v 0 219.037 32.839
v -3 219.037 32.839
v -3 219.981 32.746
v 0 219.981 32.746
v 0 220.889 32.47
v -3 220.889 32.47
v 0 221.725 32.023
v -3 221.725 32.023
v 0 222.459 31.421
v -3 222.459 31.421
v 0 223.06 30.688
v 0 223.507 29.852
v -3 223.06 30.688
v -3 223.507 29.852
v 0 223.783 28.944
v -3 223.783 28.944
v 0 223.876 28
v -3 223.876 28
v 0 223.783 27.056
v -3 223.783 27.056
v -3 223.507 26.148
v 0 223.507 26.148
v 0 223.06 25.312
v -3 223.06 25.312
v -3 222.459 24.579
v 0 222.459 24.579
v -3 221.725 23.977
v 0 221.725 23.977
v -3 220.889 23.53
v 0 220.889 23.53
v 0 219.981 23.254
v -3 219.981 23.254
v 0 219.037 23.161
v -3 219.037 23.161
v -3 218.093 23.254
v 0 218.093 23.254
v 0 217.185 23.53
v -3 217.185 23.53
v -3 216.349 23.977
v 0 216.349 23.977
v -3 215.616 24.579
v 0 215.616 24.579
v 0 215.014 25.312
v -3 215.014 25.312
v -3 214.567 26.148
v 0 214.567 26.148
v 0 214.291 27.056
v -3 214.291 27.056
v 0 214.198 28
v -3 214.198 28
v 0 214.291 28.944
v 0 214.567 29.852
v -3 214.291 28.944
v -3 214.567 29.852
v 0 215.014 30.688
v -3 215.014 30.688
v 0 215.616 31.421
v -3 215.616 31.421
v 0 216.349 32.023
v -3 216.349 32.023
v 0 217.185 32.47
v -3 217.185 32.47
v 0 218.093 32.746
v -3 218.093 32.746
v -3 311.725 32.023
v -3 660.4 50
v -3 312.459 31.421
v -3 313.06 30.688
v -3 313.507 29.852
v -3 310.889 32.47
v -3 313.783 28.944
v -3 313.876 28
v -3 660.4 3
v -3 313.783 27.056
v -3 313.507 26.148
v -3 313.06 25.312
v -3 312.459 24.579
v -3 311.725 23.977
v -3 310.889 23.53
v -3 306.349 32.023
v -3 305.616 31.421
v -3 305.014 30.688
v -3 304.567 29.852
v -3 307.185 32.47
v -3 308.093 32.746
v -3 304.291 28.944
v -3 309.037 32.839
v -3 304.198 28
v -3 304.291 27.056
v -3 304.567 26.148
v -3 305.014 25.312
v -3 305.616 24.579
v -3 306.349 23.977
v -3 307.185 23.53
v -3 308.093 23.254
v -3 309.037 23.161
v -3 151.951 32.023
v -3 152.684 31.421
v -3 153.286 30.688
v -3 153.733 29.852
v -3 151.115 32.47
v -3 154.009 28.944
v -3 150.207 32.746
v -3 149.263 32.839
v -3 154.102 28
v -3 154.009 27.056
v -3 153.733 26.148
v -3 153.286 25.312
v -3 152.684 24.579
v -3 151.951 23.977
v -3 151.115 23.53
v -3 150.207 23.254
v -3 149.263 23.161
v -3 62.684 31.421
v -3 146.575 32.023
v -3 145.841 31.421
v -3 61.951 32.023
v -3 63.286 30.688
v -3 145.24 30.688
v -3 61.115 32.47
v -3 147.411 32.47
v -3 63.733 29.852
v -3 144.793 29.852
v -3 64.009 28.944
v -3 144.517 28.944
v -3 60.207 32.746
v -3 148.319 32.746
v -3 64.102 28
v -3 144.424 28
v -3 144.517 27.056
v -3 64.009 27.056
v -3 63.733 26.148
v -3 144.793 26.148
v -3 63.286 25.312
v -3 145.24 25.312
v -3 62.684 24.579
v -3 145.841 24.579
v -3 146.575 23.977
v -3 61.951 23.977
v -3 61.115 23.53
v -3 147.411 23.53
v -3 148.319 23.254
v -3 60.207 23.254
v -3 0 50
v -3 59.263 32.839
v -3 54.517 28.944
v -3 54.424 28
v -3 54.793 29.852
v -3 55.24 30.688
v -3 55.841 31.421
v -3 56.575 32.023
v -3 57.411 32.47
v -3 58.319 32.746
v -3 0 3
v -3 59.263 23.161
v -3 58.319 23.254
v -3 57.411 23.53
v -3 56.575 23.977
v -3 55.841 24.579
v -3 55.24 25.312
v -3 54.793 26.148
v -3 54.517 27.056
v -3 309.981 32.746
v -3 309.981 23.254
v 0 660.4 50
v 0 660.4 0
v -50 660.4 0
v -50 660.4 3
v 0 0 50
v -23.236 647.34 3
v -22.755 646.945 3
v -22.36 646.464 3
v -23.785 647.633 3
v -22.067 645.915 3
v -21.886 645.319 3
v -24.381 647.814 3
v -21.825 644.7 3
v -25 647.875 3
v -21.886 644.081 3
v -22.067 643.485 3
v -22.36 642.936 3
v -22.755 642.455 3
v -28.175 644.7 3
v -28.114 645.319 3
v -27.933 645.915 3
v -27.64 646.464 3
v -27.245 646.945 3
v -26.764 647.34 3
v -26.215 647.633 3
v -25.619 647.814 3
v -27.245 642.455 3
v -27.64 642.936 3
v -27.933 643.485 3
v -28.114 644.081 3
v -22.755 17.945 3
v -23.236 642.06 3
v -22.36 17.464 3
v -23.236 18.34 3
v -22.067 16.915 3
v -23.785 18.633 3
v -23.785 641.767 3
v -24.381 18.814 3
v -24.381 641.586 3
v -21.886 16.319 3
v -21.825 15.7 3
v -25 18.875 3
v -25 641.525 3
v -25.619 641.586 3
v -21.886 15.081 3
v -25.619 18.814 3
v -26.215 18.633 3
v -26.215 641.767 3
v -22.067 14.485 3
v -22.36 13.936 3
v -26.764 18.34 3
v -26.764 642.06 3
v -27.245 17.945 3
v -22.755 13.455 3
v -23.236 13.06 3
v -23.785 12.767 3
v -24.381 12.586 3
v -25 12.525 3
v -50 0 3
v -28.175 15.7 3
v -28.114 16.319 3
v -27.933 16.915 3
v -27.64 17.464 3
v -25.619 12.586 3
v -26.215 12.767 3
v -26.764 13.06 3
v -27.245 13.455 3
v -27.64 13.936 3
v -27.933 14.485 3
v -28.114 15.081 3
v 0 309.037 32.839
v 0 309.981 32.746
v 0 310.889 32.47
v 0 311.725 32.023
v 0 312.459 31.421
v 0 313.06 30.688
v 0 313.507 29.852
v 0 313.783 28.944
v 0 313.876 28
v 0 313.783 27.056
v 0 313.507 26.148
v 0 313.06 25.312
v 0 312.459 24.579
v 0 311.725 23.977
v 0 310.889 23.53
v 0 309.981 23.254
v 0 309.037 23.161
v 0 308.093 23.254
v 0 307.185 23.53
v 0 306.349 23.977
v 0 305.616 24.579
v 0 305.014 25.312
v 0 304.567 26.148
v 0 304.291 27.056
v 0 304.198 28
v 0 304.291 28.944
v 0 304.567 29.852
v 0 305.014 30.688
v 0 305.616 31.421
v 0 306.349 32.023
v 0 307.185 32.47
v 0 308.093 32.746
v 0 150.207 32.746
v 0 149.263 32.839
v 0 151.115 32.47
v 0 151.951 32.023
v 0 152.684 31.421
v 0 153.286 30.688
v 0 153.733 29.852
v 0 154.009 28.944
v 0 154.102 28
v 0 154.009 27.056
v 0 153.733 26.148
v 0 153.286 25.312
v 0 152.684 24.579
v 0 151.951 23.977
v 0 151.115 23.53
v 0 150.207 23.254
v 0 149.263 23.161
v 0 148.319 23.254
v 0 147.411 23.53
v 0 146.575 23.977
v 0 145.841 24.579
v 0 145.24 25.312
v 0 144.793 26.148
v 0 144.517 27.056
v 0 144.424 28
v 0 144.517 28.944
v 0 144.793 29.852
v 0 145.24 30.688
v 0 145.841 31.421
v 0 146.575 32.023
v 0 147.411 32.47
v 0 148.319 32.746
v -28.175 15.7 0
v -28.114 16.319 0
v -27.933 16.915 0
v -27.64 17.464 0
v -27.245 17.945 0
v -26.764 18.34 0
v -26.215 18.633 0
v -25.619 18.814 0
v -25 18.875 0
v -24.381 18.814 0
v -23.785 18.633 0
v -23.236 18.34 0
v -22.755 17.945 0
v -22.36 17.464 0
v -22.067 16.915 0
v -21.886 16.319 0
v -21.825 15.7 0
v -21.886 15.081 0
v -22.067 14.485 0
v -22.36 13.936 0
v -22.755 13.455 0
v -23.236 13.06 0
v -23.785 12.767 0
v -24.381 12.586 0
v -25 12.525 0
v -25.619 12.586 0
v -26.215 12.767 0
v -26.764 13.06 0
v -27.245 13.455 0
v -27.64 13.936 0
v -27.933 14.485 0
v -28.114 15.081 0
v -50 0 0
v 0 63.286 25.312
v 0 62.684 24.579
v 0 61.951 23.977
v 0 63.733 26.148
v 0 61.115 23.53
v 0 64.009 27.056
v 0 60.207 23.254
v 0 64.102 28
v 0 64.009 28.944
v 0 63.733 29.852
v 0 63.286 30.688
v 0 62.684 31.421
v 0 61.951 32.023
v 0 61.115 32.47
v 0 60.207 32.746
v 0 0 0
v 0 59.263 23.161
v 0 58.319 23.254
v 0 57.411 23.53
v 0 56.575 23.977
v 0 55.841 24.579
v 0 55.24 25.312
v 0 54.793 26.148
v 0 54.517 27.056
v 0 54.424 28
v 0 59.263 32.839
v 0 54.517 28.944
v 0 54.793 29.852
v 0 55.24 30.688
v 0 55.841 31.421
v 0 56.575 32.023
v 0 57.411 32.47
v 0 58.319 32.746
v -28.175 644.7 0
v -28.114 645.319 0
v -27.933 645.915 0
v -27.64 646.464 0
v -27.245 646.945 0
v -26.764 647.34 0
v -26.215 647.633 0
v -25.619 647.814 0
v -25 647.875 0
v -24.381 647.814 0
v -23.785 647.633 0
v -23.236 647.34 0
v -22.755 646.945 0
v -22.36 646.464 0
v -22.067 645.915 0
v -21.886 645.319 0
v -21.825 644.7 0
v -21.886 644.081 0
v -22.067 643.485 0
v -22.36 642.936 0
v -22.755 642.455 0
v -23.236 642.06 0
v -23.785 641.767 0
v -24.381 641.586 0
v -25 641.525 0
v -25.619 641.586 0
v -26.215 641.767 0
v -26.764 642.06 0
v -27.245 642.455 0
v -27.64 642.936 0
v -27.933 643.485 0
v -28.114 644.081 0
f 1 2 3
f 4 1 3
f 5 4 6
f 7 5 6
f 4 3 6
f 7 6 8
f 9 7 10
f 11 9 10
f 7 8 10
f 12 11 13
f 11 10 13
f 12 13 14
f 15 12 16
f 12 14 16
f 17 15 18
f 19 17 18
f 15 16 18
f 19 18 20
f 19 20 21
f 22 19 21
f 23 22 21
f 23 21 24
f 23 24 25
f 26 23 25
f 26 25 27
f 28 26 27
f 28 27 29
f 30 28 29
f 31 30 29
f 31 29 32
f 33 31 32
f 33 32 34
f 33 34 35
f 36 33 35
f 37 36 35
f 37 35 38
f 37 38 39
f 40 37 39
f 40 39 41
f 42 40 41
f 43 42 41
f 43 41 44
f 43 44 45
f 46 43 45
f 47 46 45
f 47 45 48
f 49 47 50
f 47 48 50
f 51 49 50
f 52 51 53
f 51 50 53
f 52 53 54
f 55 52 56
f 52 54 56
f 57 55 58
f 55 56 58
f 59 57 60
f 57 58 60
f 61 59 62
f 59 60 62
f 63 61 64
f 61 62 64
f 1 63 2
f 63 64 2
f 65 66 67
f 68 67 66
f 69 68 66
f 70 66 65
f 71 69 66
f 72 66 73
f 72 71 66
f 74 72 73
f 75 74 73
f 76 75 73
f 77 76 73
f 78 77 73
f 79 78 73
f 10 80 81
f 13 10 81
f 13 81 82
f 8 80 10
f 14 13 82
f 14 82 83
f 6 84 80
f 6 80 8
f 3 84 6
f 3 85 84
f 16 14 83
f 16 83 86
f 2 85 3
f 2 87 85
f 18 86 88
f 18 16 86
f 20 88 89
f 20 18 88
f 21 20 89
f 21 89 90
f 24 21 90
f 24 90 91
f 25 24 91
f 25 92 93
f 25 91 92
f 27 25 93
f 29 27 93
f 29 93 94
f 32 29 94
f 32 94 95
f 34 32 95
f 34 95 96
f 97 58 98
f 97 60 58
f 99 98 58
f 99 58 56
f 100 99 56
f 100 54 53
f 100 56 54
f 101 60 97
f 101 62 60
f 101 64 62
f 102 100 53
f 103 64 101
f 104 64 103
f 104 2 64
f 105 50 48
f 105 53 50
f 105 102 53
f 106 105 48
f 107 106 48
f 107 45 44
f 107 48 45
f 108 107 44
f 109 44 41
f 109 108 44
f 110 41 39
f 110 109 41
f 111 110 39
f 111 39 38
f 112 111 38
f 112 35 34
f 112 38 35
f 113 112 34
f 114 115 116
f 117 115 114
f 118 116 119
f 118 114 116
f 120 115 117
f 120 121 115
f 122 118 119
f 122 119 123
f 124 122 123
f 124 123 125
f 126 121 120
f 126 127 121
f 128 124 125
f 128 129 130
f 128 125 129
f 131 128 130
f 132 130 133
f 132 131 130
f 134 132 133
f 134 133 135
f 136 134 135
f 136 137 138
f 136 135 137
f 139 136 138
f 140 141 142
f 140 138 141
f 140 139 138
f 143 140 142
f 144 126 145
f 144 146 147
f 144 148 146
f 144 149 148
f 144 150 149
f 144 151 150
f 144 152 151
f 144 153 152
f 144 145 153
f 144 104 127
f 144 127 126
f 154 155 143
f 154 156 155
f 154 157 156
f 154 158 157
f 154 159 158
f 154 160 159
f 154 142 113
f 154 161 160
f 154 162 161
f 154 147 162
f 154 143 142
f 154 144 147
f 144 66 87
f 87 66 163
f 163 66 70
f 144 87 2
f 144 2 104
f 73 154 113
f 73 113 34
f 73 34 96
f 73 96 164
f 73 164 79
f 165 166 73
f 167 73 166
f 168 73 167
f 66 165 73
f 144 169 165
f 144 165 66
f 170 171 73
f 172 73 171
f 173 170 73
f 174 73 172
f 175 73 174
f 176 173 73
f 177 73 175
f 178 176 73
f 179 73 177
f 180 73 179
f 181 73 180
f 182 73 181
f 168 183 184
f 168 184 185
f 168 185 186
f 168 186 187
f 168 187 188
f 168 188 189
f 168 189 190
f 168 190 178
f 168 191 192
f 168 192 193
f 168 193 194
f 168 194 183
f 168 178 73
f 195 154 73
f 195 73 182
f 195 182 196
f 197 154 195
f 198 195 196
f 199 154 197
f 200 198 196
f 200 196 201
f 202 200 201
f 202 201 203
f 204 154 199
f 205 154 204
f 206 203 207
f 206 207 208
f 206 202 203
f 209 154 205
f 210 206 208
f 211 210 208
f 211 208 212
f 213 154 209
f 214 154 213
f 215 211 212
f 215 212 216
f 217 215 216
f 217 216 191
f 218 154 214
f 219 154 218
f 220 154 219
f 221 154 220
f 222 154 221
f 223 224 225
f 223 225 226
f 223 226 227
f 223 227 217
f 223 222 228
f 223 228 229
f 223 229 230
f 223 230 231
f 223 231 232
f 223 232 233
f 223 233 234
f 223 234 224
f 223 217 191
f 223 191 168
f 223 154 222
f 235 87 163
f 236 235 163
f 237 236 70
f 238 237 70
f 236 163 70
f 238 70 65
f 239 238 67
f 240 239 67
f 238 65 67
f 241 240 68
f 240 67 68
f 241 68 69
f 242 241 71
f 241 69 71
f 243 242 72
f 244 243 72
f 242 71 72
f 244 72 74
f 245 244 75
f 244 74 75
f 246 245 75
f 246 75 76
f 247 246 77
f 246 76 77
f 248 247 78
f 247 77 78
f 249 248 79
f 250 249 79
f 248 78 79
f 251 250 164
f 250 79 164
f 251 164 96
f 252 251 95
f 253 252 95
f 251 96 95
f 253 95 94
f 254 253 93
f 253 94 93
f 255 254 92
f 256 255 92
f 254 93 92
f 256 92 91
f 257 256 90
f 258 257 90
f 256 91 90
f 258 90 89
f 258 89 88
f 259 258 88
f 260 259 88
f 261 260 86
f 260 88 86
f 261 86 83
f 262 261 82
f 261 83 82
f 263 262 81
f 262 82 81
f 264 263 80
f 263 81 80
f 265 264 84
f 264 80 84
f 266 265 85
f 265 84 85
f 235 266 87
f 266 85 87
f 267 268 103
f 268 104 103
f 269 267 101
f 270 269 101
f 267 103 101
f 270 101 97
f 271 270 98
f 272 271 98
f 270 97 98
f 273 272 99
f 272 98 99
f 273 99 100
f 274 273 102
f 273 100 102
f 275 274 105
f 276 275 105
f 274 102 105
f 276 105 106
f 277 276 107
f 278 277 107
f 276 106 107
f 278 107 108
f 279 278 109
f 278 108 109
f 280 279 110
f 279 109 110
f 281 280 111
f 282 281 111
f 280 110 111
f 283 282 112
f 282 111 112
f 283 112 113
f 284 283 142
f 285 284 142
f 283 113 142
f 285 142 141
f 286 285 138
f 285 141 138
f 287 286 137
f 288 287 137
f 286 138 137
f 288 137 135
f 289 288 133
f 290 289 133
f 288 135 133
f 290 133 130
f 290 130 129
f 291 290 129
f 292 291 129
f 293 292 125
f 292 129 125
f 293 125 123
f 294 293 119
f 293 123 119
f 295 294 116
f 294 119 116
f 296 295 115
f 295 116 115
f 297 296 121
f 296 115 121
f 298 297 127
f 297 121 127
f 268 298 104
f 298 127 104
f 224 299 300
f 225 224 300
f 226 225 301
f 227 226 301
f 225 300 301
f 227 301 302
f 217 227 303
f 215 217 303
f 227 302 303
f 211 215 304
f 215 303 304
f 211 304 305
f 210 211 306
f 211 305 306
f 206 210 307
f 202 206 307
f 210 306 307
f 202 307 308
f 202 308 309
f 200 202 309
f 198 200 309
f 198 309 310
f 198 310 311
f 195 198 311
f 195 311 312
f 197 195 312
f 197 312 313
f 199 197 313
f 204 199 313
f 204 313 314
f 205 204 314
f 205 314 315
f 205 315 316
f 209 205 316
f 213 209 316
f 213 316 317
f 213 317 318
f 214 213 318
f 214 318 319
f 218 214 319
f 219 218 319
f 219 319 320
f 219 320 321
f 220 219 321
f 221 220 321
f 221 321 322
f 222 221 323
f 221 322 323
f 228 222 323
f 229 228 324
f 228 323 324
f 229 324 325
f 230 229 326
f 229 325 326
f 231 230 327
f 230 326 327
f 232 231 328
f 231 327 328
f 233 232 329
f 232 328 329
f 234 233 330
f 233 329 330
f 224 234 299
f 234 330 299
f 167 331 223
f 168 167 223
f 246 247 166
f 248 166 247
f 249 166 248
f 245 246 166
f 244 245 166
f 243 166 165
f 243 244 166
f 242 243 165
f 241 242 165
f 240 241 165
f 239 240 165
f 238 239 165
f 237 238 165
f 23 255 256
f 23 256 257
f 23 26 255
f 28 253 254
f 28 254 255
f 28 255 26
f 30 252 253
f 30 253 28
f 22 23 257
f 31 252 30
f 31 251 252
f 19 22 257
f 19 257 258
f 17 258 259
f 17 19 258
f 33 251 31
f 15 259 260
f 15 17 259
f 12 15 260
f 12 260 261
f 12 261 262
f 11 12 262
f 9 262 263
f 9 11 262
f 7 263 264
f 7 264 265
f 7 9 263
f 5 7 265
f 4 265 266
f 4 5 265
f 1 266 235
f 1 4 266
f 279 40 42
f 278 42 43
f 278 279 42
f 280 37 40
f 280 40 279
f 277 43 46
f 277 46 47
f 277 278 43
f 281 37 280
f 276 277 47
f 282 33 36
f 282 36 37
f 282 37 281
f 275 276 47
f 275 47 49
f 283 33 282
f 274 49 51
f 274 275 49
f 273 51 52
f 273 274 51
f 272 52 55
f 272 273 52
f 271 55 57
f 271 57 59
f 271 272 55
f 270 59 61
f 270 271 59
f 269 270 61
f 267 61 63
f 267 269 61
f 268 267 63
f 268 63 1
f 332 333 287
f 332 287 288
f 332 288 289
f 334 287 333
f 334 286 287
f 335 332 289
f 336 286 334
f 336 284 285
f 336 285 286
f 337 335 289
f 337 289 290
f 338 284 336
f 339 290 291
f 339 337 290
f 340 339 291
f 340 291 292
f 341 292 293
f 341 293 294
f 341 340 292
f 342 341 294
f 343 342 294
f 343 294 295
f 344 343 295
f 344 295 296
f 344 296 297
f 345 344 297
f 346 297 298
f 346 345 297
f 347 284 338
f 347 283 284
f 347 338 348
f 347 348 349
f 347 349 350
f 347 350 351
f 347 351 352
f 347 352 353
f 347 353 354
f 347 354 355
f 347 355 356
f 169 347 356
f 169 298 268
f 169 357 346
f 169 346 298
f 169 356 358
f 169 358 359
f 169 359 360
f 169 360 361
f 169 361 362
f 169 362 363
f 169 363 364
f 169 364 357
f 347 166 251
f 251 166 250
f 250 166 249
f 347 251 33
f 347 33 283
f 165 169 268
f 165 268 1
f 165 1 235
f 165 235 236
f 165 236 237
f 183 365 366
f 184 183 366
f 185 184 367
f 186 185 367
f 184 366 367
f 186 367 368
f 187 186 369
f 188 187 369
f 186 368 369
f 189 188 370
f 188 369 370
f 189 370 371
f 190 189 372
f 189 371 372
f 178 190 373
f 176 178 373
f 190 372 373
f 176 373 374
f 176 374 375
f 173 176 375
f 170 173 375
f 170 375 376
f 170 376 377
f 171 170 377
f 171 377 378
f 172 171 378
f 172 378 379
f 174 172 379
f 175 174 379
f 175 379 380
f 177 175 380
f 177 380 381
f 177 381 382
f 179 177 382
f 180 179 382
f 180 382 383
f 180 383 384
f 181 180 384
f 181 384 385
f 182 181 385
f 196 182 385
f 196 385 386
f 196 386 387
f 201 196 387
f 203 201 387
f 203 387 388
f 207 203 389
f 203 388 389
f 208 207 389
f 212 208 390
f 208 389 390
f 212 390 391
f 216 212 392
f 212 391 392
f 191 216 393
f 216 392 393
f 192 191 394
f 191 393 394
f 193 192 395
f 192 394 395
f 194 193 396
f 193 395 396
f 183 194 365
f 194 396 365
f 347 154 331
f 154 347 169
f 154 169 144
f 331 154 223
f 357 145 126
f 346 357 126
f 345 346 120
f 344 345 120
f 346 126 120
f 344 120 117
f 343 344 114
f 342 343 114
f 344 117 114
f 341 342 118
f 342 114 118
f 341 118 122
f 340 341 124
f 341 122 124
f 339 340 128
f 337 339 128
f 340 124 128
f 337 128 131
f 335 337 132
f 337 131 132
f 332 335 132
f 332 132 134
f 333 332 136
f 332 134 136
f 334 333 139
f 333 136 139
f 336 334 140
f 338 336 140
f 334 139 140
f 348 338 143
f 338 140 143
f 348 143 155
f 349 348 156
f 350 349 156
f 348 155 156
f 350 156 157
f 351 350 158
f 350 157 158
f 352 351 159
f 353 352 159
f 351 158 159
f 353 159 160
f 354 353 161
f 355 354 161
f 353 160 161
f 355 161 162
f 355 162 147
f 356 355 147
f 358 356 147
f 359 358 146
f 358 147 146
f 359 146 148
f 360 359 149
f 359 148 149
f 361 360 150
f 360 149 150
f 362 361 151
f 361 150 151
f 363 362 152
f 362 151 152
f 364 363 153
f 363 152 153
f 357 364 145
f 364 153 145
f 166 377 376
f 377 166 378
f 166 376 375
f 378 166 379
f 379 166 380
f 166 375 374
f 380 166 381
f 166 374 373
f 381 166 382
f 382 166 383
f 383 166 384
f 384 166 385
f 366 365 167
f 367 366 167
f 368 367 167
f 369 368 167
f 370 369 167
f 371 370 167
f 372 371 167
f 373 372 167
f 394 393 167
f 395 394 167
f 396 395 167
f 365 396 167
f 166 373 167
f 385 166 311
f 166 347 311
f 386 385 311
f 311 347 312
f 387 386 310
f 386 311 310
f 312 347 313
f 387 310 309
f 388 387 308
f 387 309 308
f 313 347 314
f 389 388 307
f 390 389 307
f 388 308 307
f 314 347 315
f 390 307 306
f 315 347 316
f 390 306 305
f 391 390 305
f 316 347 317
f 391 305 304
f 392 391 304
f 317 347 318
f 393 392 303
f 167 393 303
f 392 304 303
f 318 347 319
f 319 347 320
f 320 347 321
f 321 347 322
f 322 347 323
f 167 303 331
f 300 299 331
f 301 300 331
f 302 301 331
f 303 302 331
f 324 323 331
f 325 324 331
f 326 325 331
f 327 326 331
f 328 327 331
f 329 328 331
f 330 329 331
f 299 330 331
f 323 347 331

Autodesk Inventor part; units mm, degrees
ref_plane "YZ Plane" through (0, 0, 0) normal (1, 0, 0) x (0, 1, 0)
ref_plane "XZ Plane" through (0, 0, 0) normal (0, 1, 0) x (-1, 0, 0)
ref_plane "XY Plane" through (0, 0, 0) normal (0, 0, 1) x (1, 0, 0)
sketch "Sketch1" plane through (0, 0, 0) normal (0, 1, 0) x (-1, 0, 0)
  line L0 (0, 0) -> (50, 0)
  line L1 (50, 0) -> (50, 3)
  line L2 (0, 0) -> (0, 50)
  line L3 (0, 50) -> (3, 50)
  line L4 (3, 50) -> (3, 3)
  line L5 (3, 3) -> (50, 3)
  dimension "d0" = 50
  dimension "d1" = 3
  dimension "d2" = 50
  dimension "d3" = 3
extrude "Extrusion1" add sketch "Sketch1" along normal blind 660.4
sketch "Sketch4" plane through (0, 0, 0) normal (0, 0, -1) x (-1, 0, 0)
  circle A0 centre (25, 15.7) radius 3.175
  circle A1 centre (25, 644.7) radius 3.175
  dimension "d62" = 6.35
  dimension "d63" = 6.35
extrude "Extrusion4" cut sketch "Sketch4" against normal blind 25.4
sketch "Sketch5" plane through (-3, 0, 3) normal (-1, 0, 0) x (0, 0, 1)
  circle A0 centre (25, 59.2629) radius 4.8387
  circle A1 centre (25, 149.2629) radius 4.8387
  circle A2 centre (25, 219.0371) radius 4.8387
  circle A3 centre (25, 309.0371) radius 4.8387
  line L0 (0, 0) -> (47, 0) projected
  line L1 (0, 0) -> (0, 660.4) projected
  line L2 (-136.6387, 184.15) -> (192.6114, 184.15) construction
  line L3 (47, 0) -> (47, 660.4) projected
  line L4 (-3, 0) -> (-3, 660.4) construction
  dimension "d68" = 90
  dimension "d70" = 90
  dimension "d71" = 69.7742
  dimension "d72" = 184.15
  dimension "d73" = 34.8871
  dimension "d74" = 34.8871
  dimension "d77" = 25
  dimension "d78" = 59.2629
  dimension "d79" = 50
extrude "Extrusion5" cut sketch "Sketch5" against normal blind 25.4
equation "\"d63\" = d62"
equation "\"d70\" = d68"
equation "\"d73\" = 0.5 * d71"
equation "\"d74\" = 0.5 * d71"
equation "\"d77\" = 0.5 * d79"
properties part number "26in Angle Channel CIM Mount Left" material "Aluminum 6061"
